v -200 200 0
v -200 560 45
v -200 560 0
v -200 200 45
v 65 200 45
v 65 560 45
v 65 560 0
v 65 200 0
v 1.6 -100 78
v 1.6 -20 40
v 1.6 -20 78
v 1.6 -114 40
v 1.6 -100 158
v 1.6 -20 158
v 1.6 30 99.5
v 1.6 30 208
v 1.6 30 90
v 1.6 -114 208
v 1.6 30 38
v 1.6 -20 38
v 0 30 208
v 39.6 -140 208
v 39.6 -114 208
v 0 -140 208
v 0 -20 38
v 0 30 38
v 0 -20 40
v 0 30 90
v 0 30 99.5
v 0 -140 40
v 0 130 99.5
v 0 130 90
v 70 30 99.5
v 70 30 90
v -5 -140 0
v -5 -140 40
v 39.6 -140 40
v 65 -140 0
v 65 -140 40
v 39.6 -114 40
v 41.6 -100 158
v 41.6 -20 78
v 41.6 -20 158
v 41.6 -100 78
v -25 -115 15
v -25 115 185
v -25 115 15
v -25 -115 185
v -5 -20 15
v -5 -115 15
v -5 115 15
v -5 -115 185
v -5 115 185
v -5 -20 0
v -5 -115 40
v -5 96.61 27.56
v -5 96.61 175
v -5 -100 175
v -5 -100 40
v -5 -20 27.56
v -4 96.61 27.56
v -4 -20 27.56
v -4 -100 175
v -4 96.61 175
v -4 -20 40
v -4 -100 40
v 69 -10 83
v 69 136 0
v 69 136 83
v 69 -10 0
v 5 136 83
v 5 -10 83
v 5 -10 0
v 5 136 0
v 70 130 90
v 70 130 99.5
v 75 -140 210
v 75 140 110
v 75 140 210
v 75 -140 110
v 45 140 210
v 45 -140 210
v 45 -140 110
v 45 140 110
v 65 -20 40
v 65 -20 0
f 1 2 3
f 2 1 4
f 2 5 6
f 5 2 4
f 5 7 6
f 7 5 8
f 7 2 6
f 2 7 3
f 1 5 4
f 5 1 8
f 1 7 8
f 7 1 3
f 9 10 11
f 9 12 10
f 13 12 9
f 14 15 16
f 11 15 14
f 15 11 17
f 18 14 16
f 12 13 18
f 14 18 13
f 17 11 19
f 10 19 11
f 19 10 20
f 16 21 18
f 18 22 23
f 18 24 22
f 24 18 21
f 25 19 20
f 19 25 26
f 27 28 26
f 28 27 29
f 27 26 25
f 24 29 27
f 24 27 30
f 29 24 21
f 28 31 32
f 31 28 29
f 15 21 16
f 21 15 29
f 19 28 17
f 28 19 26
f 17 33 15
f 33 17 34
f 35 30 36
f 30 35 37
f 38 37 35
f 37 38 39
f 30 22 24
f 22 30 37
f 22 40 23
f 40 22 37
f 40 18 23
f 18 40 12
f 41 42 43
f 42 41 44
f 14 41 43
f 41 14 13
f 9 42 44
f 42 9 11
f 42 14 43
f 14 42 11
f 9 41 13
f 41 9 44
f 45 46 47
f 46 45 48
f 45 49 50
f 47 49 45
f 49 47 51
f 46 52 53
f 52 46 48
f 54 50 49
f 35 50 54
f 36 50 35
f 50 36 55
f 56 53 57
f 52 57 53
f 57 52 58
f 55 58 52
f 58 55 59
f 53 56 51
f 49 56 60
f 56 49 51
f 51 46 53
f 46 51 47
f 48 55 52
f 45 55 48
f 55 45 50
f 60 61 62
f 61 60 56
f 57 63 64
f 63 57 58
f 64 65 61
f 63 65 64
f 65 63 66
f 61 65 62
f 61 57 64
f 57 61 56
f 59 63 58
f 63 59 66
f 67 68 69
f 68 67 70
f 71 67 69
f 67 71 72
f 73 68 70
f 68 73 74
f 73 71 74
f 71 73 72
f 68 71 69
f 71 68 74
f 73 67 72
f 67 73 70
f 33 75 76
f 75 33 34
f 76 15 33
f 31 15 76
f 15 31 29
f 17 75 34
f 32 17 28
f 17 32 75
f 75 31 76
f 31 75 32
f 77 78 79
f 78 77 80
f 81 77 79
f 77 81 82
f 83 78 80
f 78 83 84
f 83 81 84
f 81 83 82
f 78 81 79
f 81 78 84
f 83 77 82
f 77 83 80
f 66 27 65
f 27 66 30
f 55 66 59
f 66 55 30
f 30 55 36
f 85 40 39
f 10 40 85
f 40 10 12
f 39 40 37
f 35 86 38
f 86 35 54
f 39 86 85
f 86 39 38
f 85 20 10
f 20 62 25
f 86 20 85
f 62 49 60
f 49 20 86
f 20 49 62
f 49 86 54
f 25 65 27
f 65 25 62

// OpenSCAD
translate([-200,200,0]) {
	color([0, 0, 0])
		cube([265, 360, 25]);
	
	translate([265-10, 0, 25+10])
		rotate([0, -180+110*$t,0]) {
			translate([-10, 0, -10])
				color([0, 0, 0])
					cube([265, 360, 20]);
			translate([5, 20, -9])
				color([.75, .75, .75])
					cube([240, 320, 20]);
		}
}

//PSU
translate([5,-10,0])
	color([0, 0, 0])
		cube([64, 146, 83]);

//Motherboard
translate([0,-140,83-45]) {
	color([.3,.6,.3])
		cube([1.6,170,170]);

	//Ports
	translate([1.6,0,0])
		color([.9,.9,.9])
			cube([38,26,170]);

	//Cooler
	translate([1.6,40,40])
		color([.9,.9,.9])
			cube([40,80,80]);
}

//SSD
translate([0,30,90])
	color([.9,.9,.9])
		cube([70,100,9.5]);

//Keyboard
if($t<.25)
	translate([45,-280/2,110 + 500*$t])
		color([0, 1, 0])
			cube([30, 280, 100]);

if($t>=.25)
	translate([-150,-280/2,0])
		color([0, 1, 0])
			cube([100, 280, 30]);


//Mouse
translate([-90,-80,20])
	rotate([0,0,90-90*$t])
		translate([0,-120,0])
			color([0, 0, 1])
				cube([120, 70, 40], center=true);

//screen
translate([10,-230/2,200])
	rotate([0,-180+180*$t,0]) {
		translate([15,0,15])
			color([1, 0, 0])
				cube([20, 230, 170]);
		translate([14,15,25])
			color([.9, .9, .9])
				cube([1, 196.61, 147.44]);
	}
